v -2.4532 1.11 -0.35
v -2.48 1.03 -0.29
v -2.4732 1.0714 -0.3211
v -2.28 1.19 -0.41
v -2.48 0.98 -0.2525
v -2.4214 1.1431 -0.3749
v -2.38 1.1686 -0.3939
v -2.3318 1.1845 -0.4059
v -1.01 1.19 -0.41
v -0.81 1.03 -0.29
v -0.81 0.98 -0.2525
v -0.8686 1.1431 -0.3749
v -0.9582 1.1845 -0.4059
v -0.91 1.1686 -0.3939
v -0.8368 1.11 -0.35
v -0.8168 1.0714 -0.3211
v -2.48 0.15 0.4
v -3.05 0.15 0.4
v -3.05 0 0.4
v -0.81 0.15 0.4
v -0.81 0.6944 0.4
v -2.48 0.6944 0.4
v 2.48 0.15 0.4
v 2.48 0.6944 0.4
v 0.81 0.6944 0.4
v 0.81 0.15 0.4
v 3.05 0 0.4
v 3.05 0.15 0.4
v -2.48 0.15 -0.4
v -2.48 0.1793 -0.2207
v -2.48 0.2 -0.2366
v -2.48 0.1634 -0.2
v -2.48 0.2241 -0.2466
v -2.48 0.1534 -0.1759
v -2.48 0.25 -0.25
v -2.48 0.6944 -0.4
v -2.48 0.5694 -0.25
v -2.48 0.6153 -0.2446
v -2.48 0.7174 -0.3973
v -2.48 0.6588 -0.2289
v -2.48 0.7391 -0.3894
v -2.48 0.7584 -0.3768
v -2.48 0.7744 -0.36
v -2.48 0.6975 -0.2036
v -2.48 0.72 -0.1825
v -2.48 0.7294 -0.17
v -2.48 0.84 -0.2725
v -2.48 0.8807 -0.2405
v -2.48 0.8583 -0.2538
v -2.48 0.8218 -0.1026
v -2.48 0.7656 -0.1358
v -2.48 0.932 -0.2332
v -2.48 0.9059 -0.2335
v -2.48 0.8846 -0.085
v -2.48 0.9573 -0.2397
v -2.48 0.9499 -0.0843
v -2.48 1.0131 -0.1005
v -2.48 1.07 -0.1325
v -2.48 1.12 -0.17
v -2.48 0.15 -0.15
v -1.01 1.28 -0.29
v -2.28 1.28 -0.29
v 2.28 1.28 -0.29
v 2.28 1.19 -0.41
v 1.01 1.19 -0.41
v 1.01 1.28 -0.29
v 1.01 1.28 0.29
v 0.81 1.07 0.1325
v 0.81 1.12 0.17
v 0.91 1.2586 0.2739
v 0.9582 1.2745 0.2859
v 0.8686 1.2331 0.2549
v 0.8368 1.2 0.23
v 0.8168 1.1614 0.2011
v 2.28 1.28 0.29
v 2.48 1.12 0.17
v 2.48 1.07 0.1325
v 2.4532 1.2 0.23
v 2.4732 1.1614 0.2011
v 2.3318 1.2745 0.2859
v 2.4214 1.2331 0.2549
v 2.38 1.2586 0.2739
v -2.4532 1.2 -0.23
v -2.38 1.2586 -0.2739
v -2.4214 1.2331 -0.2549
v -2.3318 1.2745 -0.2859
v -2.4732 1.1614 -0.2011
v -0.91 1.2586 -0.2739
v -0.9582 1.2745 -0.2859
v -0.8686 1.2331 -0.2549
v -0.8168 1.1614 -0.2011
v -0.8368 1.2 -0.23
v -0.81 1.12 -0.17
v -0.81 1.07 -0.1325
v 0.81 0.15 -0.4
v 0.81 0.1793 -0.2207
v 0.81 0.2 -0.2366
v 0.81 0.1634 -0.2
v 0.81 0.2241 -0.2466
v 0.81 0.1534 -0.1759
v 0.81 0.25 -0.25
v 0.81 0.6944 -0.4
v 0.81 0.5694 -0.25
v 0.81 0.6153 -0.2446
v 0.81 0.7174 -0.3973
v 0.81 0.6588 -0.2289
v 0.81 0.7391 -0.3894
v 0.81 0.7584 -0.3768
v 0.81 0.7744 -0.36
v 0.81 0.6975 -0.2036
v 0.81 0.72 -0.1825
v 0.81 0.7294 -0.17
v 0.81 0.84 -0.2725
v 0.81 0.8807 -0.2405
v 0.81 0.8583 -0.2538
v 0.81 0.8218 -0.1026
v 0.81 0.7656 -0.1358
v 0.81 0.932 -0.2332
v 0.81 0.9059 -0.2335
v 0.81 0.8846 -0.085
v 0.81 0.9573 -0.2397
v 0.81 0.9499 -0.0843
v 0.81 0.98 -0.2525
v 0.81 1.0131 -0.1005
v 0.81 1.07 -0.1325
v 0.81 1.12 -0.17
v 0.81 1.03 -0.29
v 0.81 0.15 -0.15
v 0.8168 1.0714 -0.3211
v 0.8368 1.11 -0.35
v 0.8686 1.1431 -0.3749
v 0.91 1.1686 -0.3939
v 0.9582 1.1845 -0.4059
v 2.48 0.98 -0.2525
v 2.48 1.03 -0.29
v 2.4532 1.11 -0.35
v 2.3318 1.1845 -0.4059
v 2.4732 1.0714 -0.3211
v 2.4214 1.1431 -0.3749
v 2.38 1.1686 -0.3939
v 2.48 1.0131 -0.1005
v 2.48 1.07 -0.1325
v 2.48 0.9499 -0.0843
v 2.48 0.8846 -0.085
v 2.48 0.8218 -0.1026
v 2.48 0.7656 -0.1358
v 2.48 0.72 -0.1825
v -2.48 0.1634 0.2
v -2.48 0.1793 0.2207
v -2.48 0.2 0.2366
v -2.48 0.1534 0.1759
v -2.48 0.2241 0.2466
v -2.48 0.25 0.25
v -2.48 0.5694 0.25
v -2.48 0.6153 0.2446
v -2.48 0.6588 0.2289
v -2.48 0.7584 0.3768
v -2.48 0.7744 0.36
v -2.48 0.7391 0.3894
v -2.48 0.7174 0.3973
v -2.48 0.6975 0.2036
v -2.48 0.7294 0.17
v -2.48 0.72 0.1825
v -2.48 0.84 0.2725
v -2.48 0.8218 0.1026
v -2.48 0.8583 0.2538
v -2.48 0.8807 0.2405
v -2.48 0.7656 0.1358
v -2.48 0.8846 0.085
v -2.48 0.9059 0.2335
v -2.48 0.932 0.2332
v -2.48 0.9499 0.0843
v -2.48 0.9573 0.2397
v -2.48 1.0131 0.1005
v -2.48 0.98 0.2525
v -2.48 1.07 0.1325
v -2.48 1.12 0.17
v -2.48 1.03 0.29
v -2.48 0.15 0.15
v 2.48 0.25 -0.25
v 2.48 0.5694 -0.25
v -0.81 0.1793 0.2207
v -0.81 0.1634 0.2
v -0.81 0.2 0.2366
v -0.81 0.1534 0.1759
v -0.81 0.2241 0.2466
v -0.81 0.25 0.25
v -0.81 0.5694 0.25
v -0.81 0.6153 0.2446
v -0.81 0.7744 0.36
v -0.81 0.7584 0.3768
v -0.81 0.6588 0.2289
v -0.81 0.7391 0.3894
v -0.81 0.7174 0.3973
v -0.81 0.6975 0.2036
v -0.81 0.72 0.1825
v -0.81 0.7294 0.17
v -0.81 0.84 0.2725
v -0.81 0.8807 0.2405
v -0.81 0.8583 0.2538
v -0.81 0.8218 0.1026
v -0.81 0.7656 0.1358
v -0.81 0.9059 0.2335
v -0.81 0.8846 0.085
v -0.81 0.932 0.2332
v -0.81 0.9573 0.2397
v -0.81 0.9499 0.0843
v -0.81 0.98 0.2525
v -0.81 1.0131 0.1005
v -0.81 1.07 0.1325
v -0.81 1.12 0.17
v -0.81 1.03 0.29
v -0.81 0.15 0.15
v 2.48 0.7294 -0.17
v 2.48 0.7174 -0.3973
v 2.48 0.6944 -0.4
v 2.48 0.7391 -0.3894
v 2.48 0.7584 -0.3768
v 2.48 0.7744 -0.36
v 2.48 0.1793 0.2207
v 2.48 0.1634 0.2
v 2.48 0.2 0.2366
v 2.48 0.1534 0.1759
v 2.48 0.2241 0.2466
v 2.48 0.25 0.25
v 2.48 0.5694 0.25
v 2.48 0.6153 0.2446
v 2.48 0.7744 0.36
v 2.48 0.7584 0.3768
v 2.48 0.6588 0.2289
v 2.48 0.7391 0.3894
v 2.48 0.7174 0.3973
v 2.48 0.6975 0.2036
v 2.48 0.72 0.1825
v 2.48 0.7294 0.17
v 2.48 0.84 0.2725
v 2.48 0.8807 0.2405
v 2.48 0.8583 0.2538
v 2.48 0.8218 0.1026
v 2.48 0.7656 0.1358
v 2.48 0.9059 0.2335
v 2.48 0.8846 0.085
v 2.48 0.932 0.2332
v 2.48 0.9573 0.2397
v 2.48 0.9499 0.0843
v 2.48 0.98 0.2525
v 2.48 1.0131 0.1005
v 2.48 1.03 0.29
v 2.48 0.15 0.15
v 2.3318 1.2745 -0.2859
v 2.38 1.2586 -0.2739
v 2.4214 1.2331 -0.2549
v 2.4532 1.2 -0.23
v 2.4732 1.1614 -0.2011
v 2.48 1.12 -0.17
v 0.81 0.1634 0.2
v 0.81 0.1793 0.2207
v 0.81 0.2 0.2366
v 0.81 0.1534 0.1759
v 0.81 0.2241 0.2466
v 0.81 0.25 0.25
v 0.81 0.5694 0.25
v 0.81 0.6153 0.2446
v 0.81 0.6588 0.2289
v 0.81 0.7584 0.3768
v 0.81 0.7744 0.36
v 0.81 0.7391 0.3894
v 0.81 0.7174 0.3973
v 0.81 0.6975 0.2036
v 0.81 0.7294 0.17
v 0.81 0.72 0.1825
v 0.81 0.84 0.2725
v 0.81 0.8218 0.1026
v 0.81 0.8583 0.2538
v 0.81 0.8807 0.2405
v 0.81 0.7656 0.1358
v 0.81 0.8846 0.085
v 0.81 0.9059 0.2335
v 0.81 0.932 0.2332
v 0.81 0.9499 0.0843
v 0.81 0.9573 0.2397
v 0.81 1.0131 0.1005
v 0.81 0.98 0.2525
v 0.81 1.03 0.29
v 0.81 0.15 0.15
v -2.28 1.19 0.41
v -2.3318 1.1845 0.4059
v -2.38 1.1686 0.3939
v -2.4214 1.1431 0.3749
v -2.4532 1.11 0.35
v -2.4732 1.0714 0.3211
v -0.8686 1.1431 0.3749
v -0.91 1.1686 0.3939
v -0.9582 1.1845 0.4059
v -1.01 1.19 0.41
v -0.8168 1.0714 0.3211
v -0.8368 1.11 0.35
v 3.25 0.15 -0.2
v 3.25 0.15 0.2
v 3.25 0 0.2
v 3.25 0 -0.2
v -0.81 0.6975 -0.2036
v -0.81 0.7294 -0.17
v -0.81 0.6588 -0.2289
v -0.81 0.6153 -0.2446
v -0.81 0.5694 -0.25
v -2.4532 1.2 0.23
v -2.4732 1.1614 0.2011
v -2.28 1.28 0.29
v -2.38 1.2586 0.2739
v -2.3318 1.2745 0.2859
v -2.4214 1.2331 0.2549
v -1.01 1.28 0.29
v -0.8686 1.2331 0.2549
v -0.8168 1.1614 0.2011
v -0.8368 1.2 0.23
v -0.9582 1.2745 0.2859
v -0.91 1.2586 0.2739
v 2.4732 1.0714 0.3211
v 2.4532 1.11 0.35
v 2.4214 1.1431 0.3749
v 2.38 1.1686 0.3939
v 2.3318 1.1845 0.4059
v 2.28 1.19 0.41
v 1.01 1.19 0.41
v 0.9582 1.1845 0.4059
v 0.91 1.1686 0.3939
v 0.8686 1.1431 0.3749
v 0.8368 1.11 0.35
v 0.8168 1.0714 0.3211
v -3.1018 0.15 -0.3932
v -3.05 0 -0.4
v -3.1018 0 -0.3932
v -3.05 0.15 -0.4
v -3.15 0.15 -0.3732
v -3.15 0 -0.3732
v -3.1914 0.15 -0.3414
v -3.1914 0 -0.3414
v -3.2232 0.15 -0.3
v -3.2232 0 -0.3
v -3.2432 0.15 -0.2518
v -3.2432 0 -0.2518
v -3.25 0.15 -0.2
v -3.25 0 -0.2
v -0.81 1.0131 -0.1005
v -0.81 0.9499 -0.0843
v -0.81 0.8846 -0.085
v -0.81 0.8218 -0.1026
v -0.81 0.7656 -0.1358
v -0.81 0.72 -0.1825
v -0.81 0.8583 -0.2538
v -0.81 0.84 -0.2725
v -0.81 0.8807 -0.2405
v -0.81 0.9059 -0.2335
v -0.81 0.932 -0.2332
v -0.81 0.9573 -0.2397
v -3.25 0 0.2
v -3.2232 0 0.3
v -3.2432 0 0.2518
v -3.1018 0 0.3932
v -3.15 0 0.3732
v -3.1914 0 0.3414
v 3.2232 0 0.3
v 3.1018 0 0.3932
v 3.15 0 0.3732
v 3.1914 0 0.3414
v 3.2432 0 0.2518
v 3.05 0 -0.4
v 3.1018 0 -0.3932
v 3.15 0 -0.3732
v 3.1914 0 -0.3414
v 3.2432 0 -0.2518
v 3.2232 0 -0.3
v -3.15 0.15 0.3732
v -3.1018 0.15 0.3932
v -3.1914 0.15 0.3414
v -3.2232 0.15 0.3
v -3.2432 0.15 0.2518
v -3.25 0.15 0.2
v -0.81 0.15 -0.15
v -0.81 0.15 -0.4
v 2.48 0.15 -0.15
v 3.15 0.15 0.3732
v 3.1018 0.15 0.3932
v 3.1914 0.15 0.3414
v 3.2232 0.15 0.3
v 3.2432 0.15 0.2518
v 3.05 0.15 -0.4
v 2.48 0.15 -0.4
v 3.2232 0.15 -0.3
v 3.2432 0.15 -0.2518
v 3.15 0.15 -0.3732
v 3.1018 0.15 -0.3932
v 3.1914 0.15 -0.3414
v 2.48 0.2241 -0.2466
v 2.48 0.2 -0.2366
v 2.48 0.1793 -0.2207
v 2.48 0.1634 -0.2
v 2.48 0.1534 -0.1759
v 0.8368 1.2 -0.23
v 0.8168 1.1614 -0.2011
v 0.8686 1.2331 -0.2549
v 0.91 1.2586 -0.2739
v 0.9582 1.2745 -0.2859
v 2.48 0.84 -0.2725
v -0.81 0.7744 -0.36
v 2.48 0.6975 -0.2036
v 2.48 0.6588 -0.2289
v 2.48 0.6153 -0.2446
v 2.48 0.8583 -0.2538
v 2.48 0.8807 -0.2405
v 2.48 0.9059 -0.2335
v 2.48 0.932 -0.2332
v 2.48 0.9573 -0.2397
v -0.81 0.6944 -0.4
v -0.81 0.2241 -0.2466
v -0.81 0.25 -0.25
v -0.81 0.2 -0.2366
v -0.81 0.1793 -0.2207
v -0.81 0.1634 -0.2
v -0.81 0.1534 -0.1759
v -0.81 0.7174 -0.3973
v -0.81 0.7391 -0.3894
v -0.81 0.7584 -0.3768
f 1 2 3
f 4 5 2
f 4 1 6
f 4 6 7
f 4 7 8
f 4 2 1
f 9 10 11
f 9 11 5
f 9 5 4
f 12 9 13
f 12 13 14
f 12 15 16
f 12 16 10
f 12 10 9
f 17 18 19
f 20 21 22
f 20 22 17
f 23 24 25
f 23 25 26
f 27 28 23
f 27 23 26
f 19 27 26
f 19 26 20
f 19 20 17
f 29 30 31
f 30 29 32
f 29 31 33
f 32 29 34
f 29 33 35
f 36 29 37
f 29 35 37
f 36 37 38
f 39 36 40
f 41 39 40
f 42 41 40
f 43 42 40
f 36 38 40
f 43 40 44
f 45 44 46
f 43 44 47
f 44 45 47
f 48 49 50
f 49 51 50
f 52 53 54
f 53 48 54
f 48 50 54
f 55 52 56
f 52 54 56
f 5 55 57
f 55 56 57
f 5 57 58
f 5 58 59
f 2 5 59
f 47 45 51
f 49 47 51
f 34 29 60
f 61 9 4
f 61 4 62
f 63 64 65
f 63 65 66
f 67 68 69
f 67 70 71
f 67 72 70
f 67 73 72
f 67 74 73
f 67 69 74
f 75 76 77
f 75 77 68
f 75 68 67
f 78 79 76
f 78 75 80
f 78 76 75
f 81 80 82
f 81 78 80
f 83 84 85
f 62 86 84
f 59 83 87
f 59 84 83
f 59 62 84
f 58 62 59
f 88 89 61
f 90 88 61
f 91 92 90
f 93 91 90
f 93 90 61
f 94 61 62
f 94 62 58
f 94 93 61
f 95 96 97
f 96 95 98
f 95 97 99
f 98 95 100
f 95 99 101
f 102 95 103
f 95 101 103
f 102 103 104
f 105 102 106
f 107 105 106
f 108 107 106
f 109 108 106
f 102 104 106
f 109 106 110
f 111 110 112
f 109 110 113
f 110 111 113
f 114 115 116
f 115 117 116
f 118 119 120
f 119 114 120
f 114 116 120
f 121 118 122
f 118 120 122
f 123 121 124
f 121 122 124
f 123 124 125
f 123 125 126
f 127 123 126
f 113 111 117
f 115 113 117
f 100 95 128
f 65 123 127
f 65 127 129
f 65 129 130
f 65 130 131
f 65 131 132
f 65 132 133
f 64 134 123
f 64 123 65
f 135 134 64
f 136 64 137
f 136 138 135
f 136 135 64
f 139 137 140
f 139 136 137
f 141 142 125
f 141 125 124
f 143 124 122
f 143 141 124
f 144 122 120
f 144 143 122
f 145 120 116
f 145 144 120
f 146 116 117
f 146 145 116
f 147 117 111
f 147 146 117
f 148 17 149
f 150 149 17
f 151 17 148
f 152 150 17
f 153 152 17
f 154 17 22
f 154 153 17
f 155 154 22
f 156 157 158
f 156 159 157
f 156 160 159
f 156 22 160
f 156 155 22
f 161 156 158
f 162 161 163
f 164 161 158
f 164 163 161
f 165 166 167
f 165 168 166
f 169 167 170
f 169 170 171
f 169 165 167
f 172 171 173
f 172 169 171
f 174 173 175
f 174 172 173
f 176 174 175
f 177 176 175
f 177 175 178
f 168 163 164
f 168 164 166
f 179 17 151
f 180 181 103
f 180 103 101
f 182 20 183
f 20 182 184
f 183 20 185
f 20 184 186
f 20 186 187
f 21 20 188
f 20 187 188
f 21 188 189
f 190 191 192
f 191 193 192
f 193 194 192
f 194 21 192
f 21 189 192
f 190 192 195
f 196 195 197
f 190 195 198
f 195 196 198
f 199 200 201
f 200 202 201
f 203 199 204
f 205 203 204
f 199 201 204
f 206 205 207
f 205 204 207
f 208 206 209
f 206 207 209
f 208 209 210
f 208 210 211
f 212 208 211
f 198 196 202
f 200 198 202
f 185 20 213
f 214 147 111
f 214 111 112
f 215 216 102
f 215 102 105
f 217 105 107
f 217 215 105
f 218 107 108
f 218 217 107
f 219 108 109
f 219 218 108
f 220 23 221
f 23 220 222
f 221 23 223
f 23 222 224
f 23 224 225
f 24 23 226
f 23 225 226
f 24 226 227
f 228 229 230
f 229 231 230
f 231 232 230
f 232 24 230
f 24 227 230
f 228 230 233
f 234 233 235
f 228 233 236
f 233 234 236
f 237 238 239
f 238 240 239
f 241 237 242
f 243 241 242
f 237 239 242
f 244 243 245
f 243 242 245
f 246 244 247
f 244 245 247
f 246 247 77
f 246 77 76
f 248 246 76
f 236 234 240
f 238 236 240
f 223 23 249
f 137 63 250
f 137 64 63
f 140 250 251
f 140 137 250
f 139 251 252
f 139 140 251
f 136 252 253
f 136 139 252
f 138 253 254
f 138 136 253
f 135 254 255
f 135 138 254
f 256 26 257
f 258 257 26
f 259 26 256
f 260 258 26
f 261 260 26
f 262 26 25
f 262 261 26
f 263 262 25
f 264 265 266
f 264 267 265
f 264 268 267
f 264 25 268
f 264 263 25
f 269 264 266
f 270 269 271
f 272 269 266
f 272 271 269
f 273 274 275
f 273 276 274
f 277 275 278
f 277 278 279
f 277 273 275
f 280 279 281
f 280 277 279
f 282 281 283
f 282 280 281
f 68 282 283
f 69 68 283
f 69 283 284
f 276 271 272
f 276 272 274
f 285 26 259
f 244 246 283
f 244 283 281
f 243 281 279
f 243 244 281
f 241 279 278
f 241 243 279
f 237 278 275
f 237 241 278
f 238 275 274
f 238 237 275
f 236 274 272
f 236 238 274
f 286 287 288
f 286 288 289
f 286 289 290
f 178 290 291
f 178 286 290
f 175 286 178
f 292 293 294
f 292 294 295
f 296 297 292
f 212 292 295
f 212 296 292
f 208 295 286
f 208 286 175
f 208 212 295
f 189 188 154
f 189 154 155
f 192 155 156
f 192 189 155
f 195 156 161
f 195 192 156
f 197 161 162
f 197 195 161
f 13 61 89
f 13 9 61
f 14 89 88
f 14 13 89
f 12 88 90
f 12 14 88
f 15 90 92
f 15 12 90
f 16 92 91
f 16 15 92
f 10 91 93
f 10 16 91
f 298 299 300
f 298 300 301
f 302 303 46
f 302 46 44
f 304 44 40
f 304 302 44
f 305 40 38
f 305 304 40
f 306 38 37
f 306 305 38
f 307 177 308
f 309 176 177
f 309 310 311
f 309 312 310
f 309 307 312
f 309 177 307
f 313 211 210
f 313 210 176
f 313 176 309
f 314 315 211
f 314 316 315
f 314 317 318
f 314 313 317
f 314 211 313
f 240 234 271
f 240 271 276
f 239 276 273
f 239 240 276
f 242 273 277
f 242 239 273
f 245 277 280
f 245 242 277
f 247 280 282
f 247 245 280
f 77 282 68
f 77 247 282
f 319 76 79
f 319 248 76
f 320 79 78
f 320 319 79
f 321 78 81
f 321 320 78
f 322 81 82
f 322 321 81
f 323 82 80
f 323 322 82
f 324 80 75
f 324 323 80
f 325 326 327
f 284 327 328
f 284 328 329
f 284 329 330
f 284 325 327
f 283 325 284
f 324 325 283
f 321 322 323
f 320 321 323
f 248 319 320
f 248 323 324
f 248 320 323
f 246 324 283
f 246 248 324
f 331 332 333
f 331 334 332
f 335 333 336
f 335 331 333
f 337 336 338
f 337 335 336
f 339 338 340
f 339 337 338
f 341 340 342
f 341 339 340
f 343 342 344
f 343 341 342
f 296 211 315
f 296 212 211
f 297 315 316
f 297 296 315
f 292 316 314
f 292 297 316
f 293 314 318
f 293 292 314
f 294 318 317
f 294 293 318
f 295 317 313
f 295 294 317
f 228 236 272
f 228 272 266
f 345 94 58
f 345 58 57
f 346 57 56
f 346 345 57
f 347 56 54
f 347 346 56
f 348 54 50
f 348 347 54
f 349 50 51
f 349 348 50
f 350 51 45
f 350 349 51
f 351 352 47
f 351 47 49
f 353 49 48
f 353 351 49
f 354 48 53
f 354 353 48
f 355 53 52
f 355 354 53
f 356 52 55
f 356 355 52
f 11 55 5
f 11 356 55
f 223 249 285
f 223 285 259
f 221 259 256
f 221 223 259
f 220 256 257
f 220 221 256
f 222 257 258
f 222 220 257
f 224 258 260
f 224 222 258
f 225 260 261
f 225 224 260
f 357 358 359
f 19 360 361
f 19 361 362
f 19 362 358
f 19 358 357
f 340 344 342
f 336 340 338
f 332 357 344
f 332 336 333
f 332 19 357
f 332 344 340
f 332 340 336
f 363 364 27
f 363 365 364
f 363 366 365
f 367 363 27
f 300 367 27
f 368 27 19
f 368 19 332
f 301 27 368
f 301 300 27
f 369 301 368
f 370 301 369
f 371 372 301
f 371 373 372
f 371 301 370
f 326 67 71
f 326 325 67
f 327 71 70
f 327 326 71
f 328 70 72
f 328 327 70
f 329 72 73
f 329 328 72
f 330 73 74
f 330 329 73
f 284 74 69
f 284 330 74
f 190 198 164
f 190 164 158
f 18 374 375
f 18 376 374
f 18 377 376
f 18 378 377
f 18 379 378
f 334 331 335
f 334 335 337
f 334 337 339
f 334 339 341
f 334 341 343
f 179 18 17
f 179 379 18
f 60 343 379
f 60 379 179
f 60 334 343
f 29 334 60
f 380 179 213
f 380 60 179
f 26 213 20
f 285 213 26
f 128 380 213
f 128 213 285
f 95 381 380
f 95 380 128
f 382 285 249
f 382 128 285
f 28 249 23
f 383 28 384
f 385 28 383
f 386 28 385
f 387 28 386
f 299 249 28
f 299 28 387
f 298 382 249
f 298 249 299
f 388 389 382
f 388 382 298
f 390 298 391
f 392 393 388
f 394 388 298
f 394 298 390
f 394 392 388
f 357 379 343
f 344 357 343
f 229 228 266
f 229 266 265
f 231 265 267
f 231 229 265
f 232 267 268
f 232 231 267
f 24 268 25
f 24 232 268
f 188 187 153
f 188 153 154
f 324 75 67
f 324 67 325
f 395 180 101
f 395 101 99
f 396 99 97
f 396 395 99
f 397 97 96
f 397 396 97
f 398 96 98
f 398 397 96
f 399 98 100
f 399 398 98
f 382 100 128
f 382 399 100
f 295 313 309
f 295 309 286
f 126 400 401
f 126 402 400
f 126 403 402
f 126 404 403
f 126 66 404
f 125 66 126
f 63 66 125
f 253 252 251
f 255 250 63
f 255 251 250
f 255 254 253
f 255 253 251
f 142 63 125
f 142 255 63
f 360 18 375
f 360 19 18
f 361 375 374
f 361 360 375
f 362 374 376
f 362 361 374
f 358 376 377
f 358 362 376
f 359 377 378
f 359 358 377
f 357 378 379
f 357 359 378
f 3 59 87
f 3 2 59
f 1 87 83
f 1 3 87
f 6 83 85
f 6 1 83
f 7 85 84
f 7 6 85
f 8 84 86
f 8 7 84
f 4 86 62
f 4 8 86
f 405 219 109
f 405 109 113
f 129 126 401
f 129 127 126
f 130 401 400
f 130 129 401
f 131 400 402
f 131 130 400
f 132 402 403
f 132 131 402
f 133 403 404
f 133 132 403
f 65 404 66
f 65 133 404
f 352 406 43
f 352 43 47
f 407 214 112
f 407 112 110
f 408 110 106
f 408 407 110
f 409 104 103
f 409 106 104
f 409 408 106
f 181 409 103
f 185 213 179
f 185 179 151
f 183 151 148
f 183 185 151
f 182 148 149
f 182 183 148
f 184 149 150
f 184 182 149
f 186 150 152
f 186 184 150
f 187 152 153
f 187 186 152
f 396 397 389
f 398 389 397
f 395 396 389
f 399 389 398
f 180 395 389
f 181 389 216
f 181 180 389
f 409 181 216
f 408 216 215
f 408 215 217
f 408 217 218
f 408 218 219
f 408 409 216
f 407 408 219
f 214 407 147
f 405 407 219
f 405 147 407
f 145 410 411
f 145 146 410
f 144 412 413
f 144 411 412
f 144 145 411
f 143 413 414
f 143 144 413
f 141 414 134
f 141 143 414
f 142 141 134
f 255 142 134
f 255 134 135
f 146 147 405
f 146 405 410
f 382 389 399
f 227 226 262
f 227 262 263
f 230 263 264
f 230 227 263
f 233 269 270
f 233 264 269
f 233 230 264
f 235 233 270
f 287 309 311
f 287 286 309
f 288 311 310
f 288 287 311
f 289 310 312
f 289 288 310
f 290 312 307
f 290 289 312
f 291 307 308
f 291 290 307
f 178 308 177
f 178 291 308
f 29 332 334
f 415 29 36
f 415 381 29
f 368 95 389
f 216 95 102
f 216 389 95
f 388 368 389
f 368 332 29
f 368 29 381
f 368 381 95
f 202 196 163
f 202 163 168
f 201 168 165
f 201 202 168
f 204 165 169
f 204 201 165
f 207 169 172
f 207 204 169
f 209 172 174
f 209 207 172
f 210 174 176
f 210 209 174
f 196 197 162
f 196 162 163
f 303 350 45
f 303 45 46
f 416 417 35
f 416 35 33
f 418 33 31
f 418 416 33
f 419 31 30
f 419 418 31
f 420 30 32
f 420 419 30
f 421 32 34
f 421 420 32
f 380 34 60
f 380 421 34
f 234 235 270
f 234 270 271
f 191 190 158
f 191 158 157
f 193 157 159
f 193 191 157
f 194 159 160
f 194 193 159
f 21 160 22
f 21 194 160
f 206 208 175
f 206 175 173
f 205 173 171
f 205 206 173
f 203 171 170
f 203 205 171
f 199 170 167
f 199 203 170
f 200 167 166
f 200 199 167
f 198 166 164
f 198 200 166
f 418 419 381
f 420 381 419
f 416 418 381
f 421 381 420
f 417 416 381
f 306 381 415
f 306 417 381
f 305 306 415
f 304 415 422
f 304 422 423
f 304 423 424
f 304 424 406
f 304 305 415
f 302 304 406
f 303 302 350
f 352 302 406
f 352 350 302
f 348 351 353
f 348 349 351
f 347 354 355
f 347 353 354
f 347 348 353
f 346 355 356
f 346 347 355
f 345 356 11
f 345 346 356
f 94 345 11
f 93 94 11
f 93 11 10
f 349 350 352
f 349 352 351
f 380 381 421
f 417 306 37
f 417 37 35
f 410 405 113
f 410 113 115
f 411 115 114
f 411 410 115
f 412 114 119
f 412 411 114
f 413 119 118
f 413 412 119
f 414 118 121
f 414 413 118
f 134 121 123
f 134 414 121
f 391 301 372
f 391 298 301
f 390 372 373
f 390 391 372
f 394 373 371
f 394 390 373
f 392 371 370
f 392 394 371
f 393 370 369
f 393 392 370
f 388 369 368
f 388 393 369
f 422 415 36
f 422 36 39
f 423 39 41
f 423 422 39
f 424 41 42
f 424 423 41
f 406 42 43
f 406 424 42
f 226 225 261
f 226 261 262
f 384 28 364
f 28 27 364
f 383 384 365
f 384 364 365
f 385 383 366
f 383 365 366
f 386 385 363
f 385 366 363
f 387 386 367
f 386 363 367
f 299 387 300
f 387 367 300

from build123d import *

# Parameters (mm, degrees)
EXTRUDE_1_DEPTH          = 3.25
SKETCH_2_W               = 1.62
SKETCH_2_H               = 1.13
SKETCH_2_W_2             = 0.77
CUT_EXTRUDE_1_DEPTH      = 1.41
CUT_EXTRUDE_1_DEPTH_BACK = 1.41
FILLET_1_R               = 0.2


with BuildPart() as part:
    # Эскиз1 → Бобышка-Вытянуть1 (new body, symmetric)
    with BuildSketch(Plane(origin=(0, 0, 0), x_dir=(0, 0, -1), z_dir=(1, 0, 0))):
        with BuildLine():
            Line((-0.4, 0), (0.4, 0))
            Line((0.4, 0), (0.4, 0.694375))
            ThreePointArc((0.4, 0.694375), (0.389442719, 0.73909636), (0.36, 0.774375))
            Line((0.36, 0.774375), (0.2725, 0.84))
            ThreePointArc((0.2725, 0.84), (0.233505051, 0.905857864), (0.2525, 0.98))
            Line((0.2525, 0.98), (0.41, 1.19))
            Line((0.41, 1.19), (0.29, 1.28))
            Line((0.29, 1.28), (0.1325, 1.07))
            ThreePointArc((0.1325, 1.07), (0.085012627, 0.884644661), (0.1825, 0.72))
            Line((0.1825, 0.72), (0.17, 0.729375))
            ThreePointArc((0.17, 0.729375), (0.228885438, 0.658817719), (0.25, 0.569375))
            Line((0.25, 0.569375), (0.25, 0.25))
            ThreePointArc((0.25, 0.25), (0.220710678, 0.179289322), (0.15, 0.15))
            Line((0.15, 0.15), (-0.15, 0.15))
            ThreePointArc((-0.15, 0.15), (-0.220710678, 0.179289322), (-0.25, 0.25))
            Line((-0.25, 0.25), (-0.25, 0.569375))
            ThreePointArc((-0.25, 0.569375), (-0.228885438, 0.658817719), (-0.17, 0.729375))
            Line((-0.17, 0.729375), (-0.1825, 0.72))
            ThreePointArc((-0.1825, 0.72), (-0.085012627, 0.884644661), (-0.1325, 1.07))
            Line((-0.1325, 1.07), (-0.29, 1.28))
            Line((-0.29, 1.28), (-0.41, 1.19))
            Line((-0.41, 1.19), (-0.2525, 0.98))
            ThreePointArc((-0.2525, 0.98), (-0.233505051, 0.905857864), (-0.2725, 0.84))
            Line((-0.2725, 0.84), (-0.36, 0.774375))
            ThreePointArc((-0.36, 0.774375), (-0.389442719, 0.73909636), (-0.4, 0.694375))
            Line((-0.4, 0.694375), (-0.4, 0))
        make_face()
    extrude(amount=EXTRUDE_1_DEPTH, both=True)

    # Эскиз2 → Вырез-Вытянуть1 (cut, two sides)
    with BuildSketch(Plane.XY) as cut_extrude_1_sk:
        with Locations((0, 0.715)):
            Rectangle(SKETCH_2_W, SKETCH_2_H)
        with Locations((-2.865, 0.715)):
            Rectangle(SKETCH_2_W_2, SKETCH_2_H)
        with Locations((2.865, 0.715)):
            Rectangle(SKETCH_2_W_2, SKETCH_2_H)
    extrude(amount=CUT_EXTRUDE_1_DEPTH, mode=Mode.SUBTRACT)
    extrude(cut_extrude_1_sk.sketch, amount=-CUT_EXTRUDE_1_DEPTH_BACK, mode=Mode.SUBTRACT)

    # Скругление1
    fillet_1_edges = [part.edges().sort_by_distance(p)[0] for p in [
        (2.48, 1.235, -0.35),
        (2.48, 1.235, 0.35),
        (-2.48, 1.235, -0.35),
        (-2.48, 1.235, 0.35),
        (-0.81, 1.235, -0.35),
        (-0.81, 1.235, 0.35),
        (0.81, 1.235, -0.35),
        (0.81, 1.235, 0.35),
        (-3.25, 0.075, -0.4),
        (3.25, 0.075, -0.4),
        (-3.25, 0.075, 0.4),
        (3.25, 0.075, 0.4),
    ]]
    fillet(fillet_1_edges, radius=FILLET_1_R)


solid = part.part
